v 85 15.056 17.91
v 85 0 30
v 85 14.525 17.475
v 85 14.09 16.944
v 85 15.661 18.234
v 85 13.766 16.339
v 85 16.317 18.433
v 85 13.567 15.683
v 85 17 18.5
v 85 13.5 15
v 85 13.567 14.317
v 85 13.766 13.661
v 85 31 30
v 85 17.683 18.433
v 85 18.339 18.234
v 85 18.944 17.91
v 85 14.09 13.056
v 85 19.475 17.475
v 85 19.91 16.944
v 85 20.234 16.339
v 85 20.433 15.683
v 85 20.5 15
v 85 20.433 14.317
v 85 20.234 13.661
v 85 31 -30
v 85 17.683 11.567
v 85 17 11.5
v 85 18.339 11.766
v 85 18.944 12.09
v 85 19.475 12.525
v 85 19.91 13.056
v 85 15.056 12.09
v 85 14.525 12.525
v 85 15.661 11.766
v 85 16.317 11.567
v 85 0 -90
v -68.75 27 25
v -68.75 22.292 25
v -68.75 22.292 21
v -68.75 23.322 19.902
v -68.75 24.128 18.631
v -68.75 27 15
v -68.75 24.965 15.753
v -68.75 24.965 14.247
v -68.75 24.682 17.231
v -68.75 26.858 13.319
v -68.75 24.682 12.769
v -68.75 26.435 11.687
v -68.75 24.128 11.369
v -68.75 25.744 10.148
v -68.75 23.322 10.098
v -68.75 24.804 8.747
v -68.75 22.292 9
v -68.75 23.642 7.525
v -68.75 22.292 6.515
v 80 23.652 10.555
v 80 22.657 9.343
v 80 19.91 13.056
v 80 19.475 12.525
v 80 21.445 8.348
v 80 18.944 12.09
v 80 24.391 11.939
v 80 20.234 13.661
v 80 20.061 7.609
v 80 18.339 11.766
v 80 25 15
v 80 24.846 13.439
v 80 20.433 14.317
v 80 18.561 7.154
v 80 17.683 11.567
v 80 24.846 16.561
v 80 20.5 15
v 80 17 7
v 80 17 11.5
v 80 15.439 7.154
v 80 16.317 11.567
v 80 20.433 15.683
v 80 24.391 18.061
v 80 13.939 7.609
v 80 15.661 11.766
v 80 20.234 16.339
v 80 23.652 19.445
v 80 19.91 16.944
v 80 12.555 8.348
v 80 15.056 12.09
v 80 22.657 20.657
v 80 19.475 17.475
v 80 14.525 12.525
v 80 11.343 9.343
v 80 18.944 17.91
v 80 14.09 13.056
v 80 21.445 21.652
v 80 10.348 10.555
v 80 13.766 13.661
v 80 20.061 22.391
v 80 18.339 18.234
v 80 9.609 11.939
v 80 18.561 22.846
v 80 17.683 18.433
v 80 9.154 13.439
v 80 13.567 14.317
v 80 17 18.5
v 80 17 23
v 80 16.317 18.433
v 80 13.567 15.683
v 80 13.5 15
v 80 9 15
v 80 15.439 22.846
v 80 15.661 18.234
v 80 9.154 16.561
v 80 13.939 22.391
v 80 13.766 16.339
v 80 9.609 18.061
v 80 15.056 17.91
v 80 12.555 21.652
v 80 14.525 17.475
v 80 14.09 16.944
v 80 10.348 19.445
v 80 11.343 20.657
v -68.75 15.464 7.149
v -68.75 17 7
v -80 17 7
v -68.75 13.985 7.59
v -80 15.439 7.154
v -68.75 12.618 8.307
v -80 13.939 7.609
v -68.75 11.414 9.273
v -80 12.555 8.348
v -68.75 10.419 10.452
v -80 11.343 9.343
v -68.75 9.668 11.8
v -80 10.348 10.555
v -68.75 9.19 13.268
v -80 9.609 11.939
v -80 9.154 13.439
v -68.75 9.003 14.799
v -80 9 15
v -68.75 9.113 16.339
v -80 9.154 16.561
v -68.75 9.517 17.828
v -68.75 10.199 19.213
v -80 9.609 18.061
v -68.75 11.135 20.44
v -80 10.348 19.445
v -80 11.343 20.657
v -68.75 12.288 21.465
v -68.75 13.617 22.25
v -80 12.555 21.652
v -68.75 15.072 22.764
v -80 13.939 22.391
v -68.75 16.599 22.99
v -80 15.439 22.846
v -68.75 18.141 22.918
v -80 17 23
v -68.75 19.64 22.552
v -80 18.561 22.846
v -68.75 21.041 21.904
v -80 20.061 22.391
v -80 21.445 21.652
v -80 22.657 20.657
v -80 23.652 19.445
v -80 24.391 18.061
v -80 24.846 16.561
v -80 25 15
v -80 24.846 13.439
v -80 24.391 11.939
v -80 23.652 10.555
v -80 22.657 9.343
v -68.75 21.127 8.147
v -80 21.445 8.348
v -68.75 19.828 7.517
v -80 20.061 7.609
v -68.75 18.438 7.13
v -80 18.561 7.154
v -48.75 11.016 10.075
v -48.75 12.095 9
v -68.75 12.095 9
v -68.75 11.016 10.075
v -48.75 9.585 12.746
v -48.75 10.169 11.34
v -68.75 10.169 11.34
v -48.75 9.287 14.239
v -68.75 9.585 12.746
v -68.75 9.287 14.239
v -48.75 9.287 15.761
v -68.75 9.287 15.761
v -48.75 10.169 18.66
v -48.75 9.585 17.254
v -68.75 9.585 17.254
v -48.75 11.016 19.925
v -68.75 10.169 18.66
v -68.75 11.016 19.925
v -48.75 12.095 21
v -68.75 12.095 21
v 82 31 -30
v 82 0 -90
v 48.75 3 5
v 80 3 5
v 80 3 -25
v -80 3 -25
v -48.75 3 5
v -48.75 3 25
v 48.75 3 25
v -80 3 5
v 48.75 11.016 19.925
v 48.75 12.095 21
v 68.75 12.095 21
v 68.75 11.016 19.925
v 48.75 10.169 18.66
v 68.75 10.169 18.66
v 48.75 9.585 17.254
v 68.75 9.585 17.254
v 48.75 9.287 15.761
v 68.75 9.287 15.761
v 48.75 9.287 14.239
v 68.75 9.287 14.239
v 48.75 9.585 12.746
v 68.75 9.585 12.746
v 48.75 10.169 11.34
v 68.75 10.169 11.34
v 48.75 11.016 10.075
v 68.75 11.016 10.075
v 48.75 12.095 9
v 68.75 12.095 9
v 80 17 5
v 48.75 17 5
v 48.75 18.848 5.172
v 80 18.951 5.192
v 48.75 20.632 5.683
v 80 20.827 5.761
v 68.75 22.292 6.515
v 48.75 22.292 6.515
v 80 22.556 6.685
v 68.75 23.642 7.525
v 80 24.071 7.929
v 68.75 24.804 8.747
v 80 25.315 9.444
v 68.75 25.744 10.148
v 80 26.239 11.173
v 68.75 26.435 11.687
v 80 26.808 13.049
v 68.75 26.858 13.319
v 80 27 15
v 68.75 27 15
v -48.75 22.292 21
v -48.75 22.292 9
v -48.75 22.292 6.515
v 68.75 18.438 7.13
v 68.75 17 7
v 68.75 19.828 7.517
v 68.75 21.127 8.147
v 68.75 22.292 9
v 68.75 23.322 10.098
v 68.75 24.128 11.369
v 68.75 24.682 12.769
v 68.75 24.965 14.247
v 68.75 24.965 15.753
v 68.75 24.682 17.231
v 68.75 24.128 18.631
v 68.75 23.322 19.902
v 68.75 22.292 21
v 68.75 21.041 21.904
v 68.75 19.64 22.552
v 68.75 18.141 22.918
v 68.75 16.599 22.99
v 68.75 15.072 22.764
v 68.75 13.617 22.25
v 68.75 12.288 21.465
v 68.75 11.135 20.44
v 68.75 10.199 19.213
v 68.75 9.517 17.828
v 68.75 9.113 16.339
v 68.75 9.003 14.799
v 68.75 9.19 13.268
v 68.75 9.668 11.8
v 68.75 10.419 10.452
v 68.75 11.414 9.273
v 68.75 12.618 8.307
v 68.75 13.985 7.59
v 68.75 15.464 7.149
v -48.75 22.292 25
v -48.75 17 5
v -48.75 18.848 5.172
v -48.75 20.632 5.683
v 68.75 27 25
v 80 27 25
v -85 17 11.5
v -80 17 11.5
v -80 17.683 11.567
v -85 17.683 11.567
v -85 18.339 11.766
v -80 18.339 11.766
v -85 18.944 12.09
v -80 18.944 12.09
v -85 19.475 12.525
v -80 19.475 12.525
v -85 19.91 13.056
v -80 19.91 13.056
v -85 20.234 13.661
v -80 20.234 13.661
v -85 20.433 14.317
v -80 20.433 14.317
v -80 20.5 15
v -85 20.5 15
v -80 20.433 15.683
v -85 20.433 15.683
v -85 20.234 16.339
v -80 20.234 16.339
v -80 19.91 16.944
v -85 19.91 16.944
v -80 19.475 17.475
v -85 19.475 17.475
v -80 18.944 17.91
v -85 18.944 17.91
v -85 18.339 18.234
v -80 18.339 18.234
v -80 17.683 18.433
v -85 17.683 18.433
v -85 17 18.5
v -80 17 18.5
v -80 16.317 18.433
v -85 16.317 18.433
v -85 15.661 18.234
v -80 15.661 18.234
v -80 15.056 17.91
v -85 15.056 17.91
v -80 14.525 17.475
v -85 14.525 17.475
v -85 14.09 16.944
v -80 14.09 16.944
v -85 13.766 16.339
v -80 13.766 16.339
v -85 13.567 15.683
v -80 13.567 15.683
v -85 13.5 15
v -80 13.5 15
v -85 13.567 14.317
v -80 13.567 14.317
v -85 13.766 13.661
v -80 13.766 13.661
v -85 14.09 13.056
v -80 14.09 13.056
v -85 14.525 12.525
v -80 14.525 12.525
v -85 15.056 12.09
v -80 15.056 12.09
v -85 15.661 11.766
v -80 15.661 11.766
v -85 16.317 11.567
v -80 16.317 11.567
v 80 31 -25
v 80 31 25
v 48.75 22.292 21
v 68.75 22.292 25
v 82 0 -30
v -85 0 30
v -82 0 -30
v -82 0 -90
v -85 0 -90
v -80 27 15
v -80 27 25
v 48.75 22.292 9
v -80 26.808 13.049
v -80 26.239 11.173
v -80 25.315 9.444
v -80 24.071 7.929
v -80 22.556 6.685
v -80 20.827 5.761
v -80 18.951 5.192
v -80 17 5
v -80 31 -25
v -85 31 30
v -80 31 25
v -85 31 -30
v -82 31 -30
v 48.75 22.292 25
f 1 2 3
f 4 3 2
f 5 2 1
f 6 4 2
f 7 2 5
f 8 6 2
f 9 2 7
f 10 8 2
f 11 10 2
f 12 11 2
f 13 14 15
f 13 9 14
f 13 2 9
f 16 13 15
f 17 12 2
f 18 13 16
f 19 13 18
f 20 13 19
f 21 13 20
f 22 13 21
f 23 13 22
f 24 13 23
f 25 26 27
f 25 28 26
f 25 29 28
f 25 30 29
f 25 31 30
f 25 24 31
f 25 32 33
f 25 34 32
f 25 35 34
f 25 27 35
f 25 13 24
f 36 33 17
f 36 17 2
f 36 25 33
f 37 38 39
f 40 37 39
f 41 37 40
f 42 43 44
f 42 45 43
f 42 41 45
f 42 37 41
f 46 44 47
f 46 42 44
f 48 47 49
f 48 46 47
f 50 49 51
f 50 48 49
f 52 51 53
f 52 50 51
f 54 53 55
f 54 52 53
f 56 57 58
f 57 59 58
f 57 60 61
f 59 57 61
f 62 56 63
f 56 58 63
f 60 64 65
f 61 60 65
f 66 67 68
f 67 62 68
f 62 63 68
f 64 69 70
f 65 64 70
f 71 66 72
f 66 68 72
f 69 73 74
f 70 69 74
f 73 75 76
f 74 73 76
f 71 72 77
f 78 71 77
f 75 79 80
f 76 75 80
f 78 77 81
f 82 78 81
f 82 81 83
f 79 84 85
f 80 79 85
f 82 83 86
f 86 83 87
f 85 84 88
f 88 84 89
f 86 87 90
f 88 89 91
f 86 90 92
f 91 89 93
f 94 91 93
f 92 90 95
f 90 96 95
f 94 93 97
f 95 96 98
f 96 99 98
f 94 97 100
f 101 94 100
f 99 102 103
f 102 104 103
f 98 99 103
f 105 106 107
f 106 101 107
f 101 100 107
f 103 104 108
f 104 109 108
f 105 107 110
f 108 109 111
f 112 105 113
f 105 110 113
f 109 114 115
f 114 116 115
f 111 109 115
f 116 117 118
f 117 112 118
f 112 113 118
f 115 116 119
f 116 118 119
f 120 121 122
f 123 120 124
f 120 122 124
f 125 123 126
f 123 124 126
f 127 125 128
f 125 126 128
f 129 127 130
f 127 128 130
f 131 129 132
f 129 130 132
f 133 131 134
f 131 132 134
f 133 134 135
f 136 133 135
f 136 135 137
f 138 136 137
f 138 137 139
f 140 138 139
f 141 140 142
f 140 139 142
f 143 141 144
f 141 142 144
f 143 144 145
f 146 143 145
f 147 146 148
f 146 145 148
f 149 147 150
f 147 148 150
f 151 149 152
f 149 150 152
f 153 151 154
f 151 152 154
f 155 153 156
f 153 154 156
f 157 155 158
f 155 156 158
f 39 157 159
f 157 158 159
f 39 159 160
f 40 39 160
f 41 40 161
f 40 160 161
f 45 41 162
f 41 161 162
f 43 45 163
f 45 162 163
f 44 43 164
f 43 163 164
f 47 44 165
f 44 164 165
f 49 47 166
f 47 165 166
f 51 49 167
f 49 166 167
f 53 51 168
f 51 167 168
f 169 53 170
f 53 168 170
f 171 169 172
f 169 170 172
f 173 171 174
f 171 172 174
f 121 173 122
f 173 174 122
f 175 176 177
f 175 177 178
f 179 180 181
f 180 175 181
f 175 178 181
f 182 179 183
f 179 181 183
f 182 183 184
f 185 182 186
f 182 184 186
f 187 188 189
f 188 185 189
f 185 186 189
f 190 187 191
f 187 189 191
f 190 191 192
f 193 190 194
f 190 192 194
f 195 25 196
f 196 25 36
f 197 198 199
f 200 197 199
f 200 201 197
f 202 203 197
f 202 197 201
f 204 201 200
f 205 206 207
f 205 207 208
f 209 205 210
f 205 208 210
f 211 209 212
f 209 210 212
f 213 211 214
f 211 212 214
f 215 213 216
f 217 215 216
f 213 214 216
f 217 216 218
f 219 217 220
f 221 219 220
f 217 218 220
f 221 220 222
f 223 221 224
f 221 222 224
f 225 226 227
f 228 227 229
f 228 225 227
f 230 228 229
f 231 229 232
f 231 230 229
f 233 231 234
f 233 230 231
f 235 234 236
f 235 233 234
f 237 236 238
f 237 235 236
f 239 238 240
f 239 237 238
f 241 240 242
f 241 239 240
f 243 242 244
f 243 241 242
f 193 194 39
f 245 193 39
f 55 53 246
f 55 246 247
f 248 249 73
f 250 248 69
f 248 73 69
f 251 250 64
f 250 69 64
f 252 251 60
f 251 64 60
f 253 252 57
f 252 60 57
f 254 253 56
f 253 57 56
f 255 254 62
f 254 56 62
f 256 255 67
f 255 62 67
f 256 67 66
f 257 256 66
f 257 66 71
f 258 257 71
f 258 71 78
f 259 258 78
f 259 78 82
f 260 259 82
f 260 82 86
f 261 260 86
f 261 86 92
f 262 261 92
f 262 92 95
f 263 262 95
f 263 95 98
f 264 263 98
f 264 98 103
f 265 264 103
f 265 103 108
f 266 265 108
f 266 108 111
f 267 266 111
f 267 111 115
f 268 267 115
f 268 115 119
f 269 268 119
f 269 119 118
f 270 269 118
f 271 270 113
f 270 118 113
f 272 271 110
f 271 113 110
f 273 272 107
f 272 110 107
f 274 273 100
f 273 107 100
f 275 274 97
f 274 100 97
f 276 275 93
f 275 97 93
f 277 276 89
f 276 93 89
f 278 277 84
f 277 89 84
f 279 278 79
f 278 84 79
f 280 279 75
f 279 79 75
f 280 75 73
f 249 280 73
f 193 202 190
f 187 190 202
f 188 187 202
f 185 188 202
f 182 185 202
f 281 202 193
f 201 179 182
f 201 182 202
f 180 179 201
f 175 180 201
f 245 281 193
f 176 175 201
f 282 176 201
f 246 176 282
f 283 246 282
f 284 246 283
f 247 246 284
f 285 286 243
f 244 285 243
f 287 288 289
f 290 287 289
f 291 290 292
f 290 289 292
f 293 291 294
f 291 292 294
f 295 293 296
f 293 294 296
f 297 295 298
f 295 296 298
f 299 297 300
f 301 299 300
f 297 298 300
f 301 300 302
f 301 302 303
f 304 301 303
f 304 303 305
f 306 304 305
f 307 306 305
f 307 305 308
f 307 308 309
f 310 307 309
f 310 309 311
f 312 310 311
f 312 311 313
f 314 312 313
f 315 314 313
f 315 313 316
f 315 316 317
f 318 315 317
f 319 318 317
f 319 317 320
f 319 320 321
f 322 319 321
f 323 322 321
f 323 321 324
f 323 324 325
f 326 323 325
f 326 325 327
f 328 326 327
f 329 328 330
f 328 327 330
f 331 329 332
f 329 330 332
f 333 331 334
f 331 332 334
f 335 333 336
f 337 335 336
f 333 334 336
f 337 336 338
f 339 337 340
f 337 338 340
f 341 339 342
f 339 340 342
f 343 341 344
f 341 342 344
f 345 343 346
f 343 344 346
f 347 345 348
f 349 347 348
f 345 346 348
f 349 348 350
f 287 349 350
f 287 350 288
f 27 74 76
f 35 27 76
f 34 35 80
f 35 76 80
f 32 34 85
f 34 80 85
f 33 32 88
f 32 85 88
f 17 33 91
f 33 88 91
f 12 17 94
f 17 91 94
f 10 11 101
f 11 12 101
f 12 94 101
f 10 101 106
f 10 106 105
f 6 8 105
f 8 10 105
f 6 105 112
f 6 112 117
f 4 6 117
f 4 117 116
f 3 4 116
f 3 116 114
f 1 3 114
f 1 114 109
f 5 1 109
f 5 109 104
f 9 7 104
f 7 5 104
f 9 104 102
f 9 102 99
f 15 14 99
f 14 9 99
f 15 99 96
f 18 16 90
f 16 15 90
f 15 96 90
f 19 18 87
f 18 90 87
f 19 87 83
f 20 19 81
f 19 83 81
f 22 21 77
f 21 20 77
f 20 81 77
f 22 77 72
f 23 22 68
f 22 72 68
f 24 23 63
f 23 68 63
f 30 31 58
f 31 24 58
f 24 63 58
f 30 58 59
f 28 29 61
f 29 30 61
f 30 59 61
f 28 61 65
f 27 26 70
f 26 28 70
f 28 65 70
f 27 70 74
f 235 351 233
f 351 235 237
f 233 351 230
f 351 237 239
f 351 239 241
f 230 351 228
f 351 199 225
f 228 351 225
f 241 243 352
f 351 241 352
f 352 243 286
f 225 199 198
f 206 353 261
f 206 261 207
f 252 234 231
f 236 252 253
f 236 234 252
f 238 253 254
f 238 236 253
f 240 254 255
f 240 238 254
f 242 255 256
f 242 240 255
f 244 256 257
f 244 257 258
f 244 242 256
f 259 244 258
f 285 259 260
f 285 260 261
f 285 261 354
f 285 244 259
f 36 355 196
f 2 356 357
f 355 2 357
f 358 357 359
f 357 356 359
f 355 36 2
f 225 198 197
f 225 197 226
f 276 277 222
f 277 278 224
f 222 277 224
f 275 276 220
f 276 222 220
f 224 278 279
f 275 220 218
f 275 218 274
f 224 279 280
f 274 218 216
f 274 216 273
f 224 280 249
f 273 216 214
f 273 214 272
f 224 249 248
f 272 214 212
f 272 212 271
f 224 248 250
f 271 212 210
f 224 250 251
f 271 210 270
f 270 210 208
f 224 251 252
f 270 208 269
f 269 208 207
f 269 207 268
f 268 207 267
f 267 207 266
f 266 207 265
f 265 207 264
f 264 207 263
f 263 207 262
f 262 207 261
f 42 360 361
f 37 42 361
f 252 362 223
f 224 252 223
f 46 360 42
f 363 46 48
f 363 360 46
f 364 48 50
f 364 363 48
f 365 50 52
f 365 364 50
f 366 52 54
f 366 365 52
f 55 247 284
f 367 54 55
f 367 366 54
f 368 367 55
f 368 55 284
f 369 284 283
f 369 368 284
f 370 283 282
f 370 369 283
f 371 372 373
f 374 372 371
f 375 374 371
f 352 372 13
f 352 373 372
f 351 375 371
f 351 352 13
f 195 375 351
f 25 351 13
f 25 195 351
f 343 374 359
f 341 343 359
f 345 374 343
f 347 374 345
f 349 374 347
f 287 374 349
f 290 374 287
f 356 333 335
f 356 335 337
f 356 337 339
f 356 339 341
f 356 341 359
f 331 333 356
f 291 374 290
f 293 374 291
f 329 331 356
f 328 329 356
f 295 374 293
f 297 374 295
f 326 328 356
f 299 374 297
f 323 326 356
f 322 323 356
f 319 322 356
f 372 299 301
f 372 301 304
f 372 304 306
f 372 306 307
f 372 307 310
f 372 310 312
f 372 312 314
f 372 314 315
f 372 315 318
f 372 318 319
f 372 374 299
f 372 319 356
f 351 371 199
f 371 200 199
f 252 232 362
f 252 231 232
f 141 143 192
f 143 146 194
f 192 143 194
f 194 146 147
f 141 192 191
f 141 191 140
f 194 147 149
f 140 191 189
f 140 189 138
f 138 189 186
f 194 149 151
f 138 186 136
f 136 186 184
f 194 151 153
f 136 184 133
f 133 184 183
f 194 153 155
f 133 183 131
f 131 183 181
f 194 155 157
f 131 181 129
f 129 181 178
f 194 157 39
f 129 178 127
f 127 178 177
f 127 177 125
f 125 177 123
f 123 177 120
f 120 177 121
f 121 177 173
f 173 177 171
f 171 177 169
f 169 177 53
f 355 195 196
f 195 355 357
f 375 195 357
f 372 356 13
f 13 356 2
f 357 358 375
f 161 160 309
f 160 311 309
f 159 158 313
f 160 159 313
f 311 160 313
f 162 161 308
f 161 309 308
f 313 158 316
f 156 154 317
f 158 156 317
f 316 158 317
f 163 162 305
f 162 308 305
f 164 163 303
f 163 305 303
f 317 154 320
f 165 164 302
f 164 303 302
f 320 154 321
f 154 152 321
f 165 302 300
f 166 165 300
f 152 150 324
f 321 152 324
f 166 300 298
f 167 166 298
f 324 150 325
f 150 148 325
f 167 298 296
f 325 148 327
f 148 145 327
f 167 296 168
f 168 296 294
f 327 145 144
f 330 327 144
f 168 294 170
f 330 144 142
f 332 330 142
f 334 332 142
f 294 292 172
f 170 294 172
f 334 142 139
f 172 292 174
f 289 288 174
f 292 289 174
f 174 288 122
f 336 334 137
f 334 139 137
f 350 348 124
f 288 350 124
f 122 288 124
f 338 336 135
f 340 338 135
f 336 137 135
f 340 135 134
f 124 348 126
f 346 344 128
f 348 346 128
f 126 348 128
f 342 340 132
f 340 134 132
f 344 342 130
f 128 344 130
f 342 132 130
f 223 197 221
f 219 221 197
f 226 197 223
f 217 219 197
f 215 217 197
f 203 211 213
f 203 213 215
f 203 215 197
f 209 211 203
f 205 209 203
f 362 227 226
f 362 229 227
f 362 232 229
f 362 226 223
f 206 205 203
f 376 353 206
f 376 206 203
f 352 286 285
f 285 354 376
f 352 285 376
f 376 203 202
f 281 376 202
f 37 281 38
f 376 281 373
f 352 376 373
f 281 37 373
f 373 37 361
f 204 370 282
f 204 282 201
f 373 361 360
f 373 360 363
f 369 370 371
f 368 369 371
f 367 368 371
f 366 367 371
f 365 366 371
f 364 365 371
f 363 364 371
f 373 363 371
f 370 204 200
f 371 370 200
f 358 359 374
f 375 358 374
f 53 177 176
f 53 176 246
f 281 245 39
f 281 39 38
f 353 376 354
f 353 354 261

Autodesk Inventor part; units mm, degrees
ref_plane "YZ Plane" through (0, 0, 0) normal (1, 0, 0) x (0, 1, 0)
ref_plane "XZ Plane" through (0, 0, 0) normal (0, 1, 0) x (-1, 0, 0)
ref_plane "XY Plane" through (0, 0, 0) normal (0, 0, 1) x (1, 0, 0)
sketch "Sketch1" plane through (0, 0, 0) normal (0, 1, 0) x (-1, 0, 0)
  line L0 (85, 30) -> (-85, 30)
  line L1 (-85, 30) -> (-85, -30)
  line L2 (-85, -30) -> (85, -30)
  line L3 (85, -30) -> (85, 30)
  line L4 (85, 30) -> (-85, -30) construction
  line L5 (-85, 30) -> (85, -30) construction
  line L6 (0, -42) -> (0, 42) projected
  point P0 (0, 0)
  point P1 (-100, -30)
  point P2 (-85, -27)
  dimension "d0" = 170
  dimension "d1" = 60
  dimension "d32" = 15
extrude "Extrusion1" add sketch "Sketch1" along normal blind 3
sketch "Sketch2" plane through (0, 3, 0) normal (0, 1, 0) x (1, 0, 0)
  line L0 (-85, 30) -> (-85, -30) projected
  line L1 (-85, -30) -> (85, -30) projected
  line L2 (85, -30) -> (85, 30) projected
  line L3 (80, -25) -> (-80, -25)
  line L4 (-80, -25) -> (-80, 25)
  line L5 (-80, 25) -> (80, 25)
  line L6 (80, 25) -> (80, -25)
  line L7 (80, -25) -> (-80, 25) construction
  line L8 (-80, -25) -> (80, 25) construction
  line L9 (85, 30) -> (-85, 30) projected
  point P0 (0, 0)
  dimension "d36" = 160
  dimension "d37" = 50
extrude "Extrusion2" add sketch "Sketch2" along normal blind 28
sketch "Sketch7" plane through (-80, 3, 25) normal (1, 0, 0) x (0, 0, -1)
  circle A0 centre (10, 14) radius 8
  line L0 (55, -3) -> (-5, -3) projected
  circle A1 centre (10, 14) radius 10
  line L1 (0, 14) -> (0, 0)
  line L2 (0, 14) -> (20, 14)
  line L3 (20, 14) -> (20, 0)
  line L4 (-5, -3) -> (-5, 28) projected
  line L5 (0, 0) -> (20, 0)
  line L6 (10, 24) -> (0, 24)
  line L7 (0, 0) -> (0, 28) projected
  line L8 (0, 14) -> (0, 24)
  point P0 (25, -3)
  point P1 (54, -3)
  dimension "MotorDiameter" = 16
  dimension "d18" = 17
  dimension "d20" = 2
  dimension "d40" = 20
  dimension "d62" = 10
extrude "Extrusion5" add sketch "Sketch7" along normal blind 11.25 contours L2 A1 A0 | A0 L2 A1 | L3 L5 L1 A1 | L7 L6 A1
sketch "Sketch8" plane through (-68.75, 3, 25) normal (1, 0, 0) x (0, 0, -1)
  arc A0 (20, 14) -> (10, 24) centre (10, 14) ccw projected
  circle A1 centre (10, 14) radius 8 projected
  line L0 (0, 0) -> (0, 24) projected
  line L1 (20, 0) -> (0, 0) projected
  line L2 (20, 0) -> (20, 14) projected
  circle A2 centre (10, 14) radius 7.75
  line L3 (10, 24) -> (0, 24) projected
  line L4 (0, 0) -> (0, 24) projected
  line L5 (4, 9.0946) -> (4, 19.2915)
  line L6 (10, 24) -> (0, 24) projected
  line L7 (16, 9.0946) -> (16, 19.2915)
  line L8 (16, 19.2915) -> (18.4853, 19.2915)
  arc A3 (20, 14) -> (10, 24) centre (10, 14) ccw projected
  line L9 (4, 19.2915) -> (0, 19.2915)
  point P0 (25, -3)
  point P1 (4, 27)
  point P2 (4, 18.9054)
  point P3 (16, 18.9054)
  dimension "d55" = 15.5
  dimension "d63" = 12
  dimension "d64" = 6
extrude "Extrusion6" add sketch "Sketch8" along normal blind 20 contours L2 L1 L0 L9 A1 L8 A0 | A1 L5 A2 L7 | A2 L7 | L5 A2 picked at (9.114, 6.2488)
sketch "Sketch9" plane through (-80, 20, 19) normal (1, 0, 0) x (0, 0, -1)
  circle A0 centre (4, -3) radius 3.5
  line L0 (49, -20) -> (-11, -20) projected
  line L1 (-11, -20) -> (-11, 11) projected
  point P0 (19, -20)
  point P1 (44, -20)
  dimension "d27" = 7
  dimension "d28" = 17
  dimension "d41" = 15
extrude "Extrusion7" cut sketch "Sketch9" against normal up to surface (5 mm away)
mirror "Mirror2" about plane through (0, 0, 0) normal (1, 0, 0) of "Extrusion7", "Extrusion6", "Extrusion5"
sketch "Sketch14" plane through (0, 3, 0) normal (0, 1, 0) x (1, 0, 0)
  point P0 (0, 0)
sketch "Sketch15" plane through (85, 0, 30) normal (1, 0, 0) x (0, 0, -1)
  line L0 (60, 31) -> (0, 31) projected
  line L1 (60, 31) -> (120, 0)
  line L2 (120, 0) -> (60, 0)
  circle A0 centre (15, 17) radius 3.5 projected
  line L3 (0, 0) -> (60, 0) projected
  line L4 (60, 0) -> (60, 31) projected
  line L5 (0, 31) -> (60, 31) projected
  line L6 (0, 0) -> (0, 31) projected
  point P0 (30, 0)
  dimension "d67" = 60
extrude "Extrusion12" add sketch "Sketch15" against normal blind 3 contours L1 L2 L4
mirror "Mirror5" about plane through (0, 0, 0) normal (1, 0, 0) of "Extrusion12"
equation "\"d0\" = Width"
equation "\"d1\" = Length"
equation "\"d32\" = -0.5 * Width + 0.5 * FullWidth"
equation "\"d2\" = BaseWallThickness"
equation "\"d36\" = Width - 2 * SideWallThickness"
equation "\"d37\" = Length - 2 * SideWallThickness"
equation "\"d5\" = Height - 2 * BaseWallThickness"
equation "\"d18\" = DriveMotorHeight"
equation "\"d20\" = DriveMotorMountThickness"
equation "\"d28\" = DriveMotorHeight"
equation "\"d41\" = SideWallThickness + DriveMotorMountThickness + 0.5 * MotorDiameter"
equation "\"d67\" = WedgeLength"
equation "\"d68\" = BaseWallThickness"
equation "\"SideWallThickness\" = 5"
equation "\"BaseWallThickness\" = 3"
equation "\"Width\" = 170"
equation "\"Length\" = 60"
equation "\"Height\" = 34"
equation "\"DriveMotorHeight\" = 17"
equation "\"DriveMotorMountThickness\" = 2"
equation "\"WedgeLength\" = 60"
equation "\"FullWidth\" = 200"
properties part number "BodyWedgeV1" material "Thermoplastic Resin"
